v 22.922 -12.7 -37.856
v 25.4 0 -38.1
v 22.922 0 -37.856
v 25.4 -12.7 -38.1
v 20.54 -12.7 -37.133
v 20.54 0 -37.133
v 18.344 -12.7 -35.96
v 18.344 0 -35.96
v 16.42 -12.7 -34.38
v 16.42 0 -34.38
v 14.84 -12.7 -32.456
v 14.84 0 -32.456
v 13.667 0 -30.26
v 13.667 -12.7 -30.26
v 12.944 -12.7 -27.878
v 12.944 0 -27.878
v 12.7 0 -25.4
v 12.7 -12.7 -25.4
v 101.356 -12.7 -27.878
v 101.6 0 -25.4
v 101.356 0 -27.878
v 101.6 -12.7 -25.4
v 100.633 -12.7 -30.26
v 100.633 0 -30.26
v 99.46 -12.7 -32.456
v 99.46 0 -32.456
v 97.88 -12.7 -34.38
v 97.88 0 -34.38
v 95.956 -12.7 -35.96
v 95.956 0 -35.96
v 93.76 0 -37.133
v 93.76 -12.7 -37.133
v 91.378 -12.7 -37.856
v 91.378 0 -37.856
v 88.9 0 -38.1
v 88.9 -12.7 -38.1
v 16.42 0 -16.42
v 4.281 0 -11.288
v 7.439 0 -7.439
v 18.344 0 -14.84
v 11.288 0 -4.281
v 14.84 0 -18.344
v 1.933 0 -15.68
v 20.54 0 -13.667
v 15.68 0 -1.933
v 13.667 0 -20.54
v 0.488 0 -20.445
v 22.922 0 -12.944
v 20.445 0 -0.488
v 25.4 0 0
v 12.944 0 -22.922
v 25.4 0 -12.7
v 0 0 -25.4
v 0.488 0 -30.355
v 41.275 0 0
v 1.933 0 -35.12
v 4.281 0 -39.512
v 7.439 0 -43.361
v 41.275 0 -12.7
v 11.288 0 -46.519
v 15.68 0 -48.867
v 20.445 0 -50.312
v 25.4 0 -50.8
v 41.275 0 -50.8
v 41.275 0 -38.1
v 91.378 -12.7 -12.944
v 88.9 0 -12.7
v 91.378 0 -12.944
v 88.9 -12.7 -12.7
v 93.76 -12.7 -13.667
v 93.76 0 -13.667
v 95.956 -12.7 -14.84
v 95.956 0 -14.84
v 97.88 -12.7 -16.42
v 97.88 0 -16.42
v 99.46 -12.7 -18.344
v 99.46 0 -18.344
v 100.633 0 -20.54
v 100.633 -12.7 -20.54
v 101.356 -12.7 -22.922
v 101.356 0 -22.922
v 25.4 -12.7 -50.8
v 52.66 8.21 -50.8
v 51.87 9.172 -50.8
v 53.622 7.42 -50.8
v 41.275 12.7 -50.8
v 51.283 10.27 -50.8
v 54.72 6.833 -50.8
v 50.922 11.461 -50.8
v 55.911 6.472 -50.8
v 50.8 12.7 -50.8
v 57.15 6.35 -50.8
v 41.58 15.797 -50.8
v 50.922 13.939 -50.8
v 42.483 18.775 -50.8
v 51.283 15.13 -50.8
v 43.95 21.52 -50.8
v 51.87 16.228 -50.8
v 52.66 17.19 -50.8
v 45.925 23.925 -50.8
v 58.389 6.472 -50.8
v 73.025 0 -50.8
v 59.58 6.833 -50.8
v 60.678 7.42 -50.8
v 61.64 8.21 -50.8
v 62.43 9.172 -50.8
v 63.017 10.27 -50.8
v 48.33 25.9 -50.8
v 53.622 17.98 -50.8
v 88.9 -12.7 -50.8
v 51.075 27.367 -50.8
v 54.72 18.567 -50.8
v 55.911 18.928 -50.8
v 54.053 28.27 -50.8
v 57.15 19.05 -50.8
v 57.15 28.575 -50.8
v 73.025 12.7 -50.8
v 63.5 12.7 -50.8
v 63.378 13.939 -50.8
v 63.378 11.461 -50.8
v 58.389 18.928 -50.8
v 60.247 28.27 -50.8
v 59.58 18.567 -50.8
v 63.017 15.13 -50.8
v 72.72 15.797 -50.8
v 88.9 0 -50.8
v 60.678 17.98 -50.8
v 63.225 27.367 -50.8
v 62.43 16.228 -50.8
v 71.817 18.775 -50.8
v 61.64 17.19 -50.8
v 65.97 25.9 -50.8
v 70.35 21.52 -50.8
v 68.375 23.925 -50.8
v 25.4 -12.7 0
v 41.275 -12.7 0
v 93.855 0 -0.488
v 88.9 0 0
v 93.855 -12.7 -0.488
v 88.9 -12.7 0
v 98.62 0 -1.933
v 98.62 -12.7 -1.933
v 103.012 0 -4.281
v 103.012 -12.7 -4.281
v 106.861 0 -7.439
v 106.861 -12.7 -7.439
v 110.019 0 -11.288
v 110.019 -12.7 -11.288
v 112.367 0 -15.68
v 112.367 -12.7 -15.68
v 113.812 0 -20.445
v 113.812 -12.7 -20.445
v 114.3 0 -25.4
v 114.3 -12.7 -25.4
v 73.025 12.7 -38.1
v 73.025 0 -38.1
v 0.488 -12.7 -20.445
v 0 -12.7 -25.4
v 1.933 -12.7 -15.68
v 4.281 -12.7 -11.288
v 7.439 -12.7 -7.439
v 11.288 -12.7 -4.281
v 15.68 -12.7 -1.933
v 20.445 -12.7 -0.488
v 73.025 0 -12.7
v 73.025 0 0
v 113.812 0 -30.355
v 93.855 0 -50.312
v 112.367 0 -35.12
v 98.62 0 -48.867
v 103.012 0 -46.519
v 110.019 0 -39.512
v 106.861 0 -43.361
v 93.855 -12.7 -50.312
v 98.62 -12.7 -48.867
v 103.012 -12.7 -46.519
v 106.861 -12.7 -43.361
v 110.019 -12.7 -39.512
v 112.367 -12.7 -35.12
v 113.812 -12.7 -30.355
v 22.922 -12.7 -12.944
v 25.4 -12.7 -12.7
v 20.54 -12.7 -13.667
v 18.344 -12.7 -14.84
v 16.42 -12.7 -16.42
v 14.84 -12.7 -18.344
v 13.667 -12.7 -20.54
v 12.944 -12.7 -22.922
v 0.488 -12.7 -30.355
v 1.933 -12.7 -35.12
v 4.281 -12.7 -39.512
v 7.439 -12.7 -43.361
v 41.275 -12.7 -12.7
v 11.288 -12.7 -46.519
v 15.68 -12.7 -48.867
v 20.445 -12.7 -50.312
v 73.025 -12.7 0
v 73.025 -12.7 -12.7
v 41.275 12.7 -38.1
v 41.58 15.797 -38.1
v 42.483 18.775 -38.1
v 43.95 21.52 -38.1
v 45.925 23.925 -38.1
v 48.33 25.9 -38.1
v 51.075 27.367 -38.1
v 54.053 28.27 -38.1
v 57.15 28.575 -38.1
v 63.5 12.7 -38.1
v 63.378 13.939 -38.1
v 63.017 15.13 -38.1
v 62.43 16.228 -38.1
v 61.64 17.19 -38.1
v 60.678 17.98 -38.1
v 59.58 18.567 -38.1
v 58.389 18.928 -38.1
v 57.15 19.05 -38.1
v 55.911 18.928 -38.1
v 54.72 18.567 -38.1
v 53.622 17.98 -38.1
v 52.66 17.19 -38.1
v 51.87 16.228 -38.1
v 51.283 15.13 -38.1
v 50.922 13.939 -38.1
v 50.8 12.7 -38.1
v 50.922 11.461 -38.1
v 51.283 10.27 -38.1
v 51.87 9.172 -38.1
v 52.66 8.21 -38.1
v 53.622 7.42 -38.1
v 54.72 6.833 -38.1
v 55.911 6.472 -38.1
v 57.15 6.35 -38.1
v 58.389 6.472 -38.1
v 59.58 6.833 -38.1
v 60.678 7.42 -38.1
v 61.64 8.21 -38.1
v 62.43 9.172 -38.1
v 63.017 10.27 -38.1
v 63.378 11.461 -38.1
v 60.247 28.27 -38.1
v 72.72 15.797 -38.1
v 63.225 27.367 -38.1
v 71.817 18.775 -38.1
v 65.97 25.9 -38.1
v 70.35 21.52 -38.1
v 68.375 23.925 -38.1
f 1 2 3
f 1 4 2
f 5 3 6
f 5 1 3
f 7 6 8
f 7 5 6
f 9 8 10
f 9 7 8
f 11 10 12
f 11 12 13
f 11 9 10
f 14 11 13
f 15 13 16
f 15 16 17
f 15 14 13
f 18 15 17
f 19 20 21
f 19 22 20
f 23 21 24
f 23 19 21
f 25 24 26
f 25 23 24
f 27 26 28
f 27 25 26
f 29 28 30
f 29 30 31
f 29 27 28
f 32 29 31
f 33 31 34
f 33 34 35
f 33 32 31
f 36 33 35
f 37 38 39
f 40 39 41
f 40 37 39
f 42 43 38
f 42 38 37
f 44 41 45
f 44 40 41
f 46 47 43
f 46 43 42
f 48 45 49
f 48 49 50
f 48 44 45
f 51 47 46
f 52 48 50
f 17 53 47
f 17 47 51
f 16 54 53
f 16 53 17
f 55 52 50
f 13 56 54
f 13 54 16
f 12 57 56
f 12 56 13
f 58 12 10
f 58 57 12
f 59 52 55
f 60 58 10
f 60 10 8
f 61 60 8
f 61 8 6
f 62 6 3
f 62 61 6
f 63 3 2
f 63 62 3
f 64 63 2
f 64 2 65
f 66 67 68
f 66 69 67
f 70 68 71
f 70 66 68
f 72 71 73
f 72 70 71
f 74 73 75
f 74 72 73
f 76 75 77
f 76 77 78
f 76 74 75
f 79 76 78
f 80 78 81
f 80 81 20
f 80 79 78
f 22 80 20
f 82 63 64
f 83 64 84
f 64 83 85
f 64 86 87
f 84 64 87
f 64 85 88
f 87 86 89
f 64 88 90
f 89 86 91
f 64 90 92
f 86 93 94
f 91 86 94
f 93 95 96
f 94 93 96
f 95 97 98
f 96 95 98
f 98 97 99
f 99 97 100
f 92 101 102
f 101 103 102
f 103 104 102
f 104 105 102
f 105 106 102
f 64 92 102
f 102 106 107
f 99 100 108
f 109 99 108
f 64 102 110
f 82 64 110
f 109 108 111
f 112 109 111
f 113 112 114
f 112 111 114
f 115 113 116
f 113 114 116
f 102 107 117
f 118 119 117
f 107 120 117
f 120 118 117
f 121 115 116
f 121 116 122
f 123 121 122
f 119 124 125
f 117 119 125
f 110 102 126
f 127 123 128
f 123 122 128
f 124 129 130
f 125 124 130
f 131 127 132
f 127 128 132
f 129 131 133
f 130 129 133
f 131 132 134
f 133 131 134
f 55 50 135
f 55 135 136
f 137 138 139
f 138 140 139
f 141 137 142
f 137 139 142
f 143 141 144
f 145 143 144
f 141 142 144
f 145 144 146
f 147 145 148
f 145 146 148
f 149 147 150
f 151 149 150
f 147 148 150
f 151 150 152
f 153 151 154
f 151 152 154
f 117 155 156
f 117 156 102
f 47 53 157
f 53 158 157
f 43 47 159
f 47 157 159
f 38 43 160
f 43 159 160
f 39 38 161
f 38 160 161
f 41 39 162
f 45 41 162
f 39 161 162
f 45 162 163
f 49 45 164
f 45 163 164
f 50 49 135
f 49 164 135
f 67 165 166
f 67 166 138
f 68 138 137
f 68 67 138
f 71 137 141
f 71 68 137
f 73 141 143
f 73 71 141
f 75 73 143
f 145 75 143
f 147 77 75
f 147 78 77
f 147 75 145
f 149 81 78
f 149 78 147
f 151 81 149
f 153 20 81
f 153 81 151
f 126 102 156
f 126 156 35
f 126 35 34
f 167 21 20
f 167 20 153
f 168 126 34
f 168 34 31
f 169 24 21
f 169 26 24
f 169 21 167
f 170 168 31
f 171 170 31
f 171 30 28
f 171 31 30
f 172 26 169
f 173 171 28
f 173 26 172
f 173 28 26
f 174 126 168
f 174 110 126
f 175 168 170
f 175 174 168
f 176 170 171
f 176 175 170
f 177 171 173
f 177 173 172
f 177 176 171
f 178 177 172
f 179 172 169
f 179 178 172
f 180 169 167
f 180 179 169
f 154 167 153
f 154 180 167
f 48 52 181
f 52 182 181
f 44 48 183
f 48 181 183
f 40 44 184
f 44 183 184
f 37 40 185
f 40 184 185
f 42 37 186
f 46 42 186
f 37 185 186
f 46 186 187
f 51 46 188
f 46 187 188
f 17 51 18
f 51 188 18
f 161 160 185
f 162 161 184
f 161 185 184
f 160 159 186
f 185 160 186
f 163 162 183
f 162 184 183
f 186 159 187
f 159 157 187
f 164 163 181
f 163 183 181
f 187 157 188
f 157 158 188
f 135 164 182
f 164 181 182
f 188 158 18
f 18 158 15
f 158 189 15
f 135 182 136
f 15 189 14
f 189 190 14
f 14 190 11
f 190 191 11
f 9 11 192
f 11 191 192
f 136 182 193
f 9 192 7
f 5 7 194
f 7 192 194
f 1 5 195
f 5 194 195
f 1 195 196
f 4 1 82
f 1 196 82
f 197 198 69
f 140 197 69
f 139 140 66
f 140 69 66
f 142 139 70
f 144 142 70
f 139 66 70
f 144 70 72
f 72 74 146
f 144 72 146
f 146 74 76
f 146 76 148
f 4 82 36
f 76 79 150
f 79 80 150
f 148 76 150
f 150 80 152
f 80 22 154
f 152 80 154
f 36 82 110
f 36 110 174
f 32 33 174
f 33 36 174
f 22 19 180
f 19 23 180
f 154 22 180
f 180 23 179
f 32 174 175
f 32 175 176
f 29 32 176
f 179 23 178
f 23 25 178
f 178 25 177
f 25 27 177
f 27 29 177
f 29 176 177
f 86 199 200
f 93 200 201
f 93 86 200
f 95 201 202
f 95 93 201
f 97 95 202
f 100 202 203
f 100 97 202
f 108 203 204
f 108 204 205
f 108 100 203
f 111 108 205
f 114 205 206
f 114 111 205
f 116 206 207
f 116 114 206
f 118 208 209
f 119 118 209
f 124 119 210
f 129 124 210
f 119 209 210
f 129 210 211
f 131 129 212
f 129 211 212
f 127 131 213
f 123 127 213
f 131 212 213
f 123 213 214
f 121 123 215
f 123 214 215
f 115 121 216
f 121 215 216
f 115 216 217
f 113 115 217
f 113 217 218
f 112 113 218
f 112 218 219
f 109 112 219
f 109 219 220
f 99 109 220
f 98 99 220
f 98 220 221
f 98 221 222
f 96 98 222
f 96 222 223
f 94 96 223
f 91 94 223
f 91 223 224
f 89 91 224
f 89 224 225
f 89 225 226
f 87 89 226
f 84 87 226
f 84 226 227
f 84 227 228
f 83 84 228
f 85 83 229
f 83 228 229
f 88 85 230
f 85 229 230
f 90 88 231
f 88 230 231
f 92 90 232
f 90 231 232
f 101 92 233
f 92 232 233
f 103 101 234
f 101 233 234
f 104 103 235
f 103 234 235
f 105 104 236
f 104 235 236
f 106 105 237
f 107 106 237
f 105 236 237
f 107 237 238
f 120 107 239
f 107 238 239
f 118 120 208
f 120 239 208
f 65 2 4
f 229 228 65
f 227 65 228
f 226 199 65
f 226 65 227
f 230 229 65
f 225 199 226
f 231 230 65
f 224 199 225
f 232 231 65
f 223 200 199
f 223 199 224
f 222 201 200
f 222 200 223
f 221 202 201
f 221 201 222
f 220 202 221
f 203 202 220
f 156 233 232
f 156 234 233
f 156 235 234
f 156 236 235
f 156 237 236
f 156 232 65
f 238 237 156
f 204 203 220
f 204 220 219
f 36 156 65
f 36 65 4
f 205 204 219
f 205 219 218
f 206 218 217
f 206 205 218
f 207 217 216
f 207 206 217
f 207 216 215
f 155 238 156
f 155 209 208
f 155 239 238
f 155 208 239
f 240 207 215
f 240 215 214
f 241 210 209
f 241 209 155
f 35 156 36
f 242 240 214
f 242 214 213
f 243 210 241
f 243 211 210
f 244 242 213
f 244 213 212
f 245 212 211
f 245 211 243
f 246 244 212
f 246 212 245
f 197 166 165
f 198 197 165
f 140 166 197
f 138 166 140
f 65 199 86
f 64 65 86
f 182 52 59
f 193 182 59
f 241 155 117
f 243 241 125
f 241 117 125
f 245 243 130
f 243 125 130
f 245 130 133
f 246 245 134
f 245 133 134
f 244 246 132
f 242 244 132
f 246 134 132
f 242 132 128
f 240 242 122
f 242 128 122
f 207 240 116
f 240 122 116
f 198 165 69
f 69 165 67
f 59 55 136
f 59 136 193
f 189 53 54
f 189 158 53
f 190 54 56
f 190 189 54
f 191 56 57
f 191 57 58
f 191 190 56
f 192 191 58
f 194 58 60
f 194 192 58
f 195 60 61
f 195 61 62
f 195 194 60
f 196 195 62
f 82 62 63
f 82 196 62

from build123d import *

# Parameters (mm, degrees)
SKETCH2_W           = 114.3
SKETCH2_H           = 50.8
SKETCH2_W_2         = 88.9
SKETCH2_H_2         = 25.4
BOSS_EXTRUDE1_DEPTH = 12.7
FILLET3_R           = 25.4
FILLET4_R           = 12.7
SKETCH5_W           = 31.75
SKETCH5_H           = 12.7
BOSS_EXTRUDE2_DEPTH = 28.575
FILLET5_R           = 15.875
SKETCH6_R           = 6.35
CUT_EXTRUDE1_DEPTH  = 124.825
SKETCH7_W           = 31.75
SKETCH7_H           = 12.7
CUT_EXTRUDE2_DEPTH  = 129.30300318


with BuildPart() as part:
    # Sketch2 → Boss-Extrude1 (new body)
    with BuildSketch(Plane(origin=(0, 0, 0), x_dir=(1, 0, 0), z_dir=(0, 1, 0))):
        with Locations((57.15, 25.4)):
            Rectangle(SKETCH2_W, SKETCH2_H)
        with Locations((57.15, 25.4)):
            Rectangle(SKETCH2_W_2, SKETCH2_H_2, mode=Mode.SUBTRACT)
    extrude(amount=-BOSS_EXTRUDE1_DEPTH)

    # Fillet3
    fillet3_edges = [part.edges().sort_by_distance(p)[0] for p in [
        (0, -6.35, 0),
        (0, -6.35, -50.8),
        (114.3, -6.35, -50.8),
        (114.3, -6.35, 0),
    ]]
    fillet(fillet3_edges, radius=FILLET3_R - 0.0001)  # a hair under: the kernel refuses the full size

    # Fillet4
    fillet4_edges = [part.edges().sort_by_distance(p)[0] for p in [
        (12.7, -6.35, -12.7),
        (101.6, -6.35, -12.7),
        (101.6, -6.35, -38.1),
        (12.7, -6.35, -38.1),
    ]]
    fillet(fillet4_edges, radius=FILLET4_R - 0.0001)  # a hair under: the kernel refuses the full size

    # Sketch5 → Boss-Extrude2 (add)
    with BuildSketch(Plane(origin=(0, 0, 0), x_dir=(1, 0, 0), z_dir=(0, 1, 0))):
        with Locations((57.15, 44.45)):
            Rectangle(SKETCH5_W, SKETCH5_H)
    extrude(amount=BOSS_EXTRUDE2_DEPTH)

    # Fillet5
    fillet5_edges = [part.edges().sort_by_distance(p)[0] for p in [
        (41.275, 28.575, -44.45),
        (73.025, 28.575, -44.45),
    ]]
    fillet(fillet5_edges, radius=FILLET5_R - 0.0001)  # a hair under: the kernel refuses the full size

    # Sketch6 → Cut-Extrude1 (cut, through all)
    with BuildSketch(Plane.XY.offset(-38.1)):
        with Locations((57.15, 12.7)):
            Circle(SKETCH6_R)
    extrude(amount=-CUT_EXTRUDE1_DEPTH, mode=Mode.SUBTRACT)

    # Sketch7 → Cut-Extrude2 (cut, through all)
    with BuildSketch(Plane(origin=(0, 0, 0), x_dir=(1, 0, 0), z_dir=(0, 1, 0))):
        with Locations((57.15, 6.35)):
            Rectangle(SKETCH7_W, SKETCH7_H)
    extrude(amount=-CUT_EXTRUDE2_DEPTH, mode=Mode.SUBTRACT)


solid = part.part
